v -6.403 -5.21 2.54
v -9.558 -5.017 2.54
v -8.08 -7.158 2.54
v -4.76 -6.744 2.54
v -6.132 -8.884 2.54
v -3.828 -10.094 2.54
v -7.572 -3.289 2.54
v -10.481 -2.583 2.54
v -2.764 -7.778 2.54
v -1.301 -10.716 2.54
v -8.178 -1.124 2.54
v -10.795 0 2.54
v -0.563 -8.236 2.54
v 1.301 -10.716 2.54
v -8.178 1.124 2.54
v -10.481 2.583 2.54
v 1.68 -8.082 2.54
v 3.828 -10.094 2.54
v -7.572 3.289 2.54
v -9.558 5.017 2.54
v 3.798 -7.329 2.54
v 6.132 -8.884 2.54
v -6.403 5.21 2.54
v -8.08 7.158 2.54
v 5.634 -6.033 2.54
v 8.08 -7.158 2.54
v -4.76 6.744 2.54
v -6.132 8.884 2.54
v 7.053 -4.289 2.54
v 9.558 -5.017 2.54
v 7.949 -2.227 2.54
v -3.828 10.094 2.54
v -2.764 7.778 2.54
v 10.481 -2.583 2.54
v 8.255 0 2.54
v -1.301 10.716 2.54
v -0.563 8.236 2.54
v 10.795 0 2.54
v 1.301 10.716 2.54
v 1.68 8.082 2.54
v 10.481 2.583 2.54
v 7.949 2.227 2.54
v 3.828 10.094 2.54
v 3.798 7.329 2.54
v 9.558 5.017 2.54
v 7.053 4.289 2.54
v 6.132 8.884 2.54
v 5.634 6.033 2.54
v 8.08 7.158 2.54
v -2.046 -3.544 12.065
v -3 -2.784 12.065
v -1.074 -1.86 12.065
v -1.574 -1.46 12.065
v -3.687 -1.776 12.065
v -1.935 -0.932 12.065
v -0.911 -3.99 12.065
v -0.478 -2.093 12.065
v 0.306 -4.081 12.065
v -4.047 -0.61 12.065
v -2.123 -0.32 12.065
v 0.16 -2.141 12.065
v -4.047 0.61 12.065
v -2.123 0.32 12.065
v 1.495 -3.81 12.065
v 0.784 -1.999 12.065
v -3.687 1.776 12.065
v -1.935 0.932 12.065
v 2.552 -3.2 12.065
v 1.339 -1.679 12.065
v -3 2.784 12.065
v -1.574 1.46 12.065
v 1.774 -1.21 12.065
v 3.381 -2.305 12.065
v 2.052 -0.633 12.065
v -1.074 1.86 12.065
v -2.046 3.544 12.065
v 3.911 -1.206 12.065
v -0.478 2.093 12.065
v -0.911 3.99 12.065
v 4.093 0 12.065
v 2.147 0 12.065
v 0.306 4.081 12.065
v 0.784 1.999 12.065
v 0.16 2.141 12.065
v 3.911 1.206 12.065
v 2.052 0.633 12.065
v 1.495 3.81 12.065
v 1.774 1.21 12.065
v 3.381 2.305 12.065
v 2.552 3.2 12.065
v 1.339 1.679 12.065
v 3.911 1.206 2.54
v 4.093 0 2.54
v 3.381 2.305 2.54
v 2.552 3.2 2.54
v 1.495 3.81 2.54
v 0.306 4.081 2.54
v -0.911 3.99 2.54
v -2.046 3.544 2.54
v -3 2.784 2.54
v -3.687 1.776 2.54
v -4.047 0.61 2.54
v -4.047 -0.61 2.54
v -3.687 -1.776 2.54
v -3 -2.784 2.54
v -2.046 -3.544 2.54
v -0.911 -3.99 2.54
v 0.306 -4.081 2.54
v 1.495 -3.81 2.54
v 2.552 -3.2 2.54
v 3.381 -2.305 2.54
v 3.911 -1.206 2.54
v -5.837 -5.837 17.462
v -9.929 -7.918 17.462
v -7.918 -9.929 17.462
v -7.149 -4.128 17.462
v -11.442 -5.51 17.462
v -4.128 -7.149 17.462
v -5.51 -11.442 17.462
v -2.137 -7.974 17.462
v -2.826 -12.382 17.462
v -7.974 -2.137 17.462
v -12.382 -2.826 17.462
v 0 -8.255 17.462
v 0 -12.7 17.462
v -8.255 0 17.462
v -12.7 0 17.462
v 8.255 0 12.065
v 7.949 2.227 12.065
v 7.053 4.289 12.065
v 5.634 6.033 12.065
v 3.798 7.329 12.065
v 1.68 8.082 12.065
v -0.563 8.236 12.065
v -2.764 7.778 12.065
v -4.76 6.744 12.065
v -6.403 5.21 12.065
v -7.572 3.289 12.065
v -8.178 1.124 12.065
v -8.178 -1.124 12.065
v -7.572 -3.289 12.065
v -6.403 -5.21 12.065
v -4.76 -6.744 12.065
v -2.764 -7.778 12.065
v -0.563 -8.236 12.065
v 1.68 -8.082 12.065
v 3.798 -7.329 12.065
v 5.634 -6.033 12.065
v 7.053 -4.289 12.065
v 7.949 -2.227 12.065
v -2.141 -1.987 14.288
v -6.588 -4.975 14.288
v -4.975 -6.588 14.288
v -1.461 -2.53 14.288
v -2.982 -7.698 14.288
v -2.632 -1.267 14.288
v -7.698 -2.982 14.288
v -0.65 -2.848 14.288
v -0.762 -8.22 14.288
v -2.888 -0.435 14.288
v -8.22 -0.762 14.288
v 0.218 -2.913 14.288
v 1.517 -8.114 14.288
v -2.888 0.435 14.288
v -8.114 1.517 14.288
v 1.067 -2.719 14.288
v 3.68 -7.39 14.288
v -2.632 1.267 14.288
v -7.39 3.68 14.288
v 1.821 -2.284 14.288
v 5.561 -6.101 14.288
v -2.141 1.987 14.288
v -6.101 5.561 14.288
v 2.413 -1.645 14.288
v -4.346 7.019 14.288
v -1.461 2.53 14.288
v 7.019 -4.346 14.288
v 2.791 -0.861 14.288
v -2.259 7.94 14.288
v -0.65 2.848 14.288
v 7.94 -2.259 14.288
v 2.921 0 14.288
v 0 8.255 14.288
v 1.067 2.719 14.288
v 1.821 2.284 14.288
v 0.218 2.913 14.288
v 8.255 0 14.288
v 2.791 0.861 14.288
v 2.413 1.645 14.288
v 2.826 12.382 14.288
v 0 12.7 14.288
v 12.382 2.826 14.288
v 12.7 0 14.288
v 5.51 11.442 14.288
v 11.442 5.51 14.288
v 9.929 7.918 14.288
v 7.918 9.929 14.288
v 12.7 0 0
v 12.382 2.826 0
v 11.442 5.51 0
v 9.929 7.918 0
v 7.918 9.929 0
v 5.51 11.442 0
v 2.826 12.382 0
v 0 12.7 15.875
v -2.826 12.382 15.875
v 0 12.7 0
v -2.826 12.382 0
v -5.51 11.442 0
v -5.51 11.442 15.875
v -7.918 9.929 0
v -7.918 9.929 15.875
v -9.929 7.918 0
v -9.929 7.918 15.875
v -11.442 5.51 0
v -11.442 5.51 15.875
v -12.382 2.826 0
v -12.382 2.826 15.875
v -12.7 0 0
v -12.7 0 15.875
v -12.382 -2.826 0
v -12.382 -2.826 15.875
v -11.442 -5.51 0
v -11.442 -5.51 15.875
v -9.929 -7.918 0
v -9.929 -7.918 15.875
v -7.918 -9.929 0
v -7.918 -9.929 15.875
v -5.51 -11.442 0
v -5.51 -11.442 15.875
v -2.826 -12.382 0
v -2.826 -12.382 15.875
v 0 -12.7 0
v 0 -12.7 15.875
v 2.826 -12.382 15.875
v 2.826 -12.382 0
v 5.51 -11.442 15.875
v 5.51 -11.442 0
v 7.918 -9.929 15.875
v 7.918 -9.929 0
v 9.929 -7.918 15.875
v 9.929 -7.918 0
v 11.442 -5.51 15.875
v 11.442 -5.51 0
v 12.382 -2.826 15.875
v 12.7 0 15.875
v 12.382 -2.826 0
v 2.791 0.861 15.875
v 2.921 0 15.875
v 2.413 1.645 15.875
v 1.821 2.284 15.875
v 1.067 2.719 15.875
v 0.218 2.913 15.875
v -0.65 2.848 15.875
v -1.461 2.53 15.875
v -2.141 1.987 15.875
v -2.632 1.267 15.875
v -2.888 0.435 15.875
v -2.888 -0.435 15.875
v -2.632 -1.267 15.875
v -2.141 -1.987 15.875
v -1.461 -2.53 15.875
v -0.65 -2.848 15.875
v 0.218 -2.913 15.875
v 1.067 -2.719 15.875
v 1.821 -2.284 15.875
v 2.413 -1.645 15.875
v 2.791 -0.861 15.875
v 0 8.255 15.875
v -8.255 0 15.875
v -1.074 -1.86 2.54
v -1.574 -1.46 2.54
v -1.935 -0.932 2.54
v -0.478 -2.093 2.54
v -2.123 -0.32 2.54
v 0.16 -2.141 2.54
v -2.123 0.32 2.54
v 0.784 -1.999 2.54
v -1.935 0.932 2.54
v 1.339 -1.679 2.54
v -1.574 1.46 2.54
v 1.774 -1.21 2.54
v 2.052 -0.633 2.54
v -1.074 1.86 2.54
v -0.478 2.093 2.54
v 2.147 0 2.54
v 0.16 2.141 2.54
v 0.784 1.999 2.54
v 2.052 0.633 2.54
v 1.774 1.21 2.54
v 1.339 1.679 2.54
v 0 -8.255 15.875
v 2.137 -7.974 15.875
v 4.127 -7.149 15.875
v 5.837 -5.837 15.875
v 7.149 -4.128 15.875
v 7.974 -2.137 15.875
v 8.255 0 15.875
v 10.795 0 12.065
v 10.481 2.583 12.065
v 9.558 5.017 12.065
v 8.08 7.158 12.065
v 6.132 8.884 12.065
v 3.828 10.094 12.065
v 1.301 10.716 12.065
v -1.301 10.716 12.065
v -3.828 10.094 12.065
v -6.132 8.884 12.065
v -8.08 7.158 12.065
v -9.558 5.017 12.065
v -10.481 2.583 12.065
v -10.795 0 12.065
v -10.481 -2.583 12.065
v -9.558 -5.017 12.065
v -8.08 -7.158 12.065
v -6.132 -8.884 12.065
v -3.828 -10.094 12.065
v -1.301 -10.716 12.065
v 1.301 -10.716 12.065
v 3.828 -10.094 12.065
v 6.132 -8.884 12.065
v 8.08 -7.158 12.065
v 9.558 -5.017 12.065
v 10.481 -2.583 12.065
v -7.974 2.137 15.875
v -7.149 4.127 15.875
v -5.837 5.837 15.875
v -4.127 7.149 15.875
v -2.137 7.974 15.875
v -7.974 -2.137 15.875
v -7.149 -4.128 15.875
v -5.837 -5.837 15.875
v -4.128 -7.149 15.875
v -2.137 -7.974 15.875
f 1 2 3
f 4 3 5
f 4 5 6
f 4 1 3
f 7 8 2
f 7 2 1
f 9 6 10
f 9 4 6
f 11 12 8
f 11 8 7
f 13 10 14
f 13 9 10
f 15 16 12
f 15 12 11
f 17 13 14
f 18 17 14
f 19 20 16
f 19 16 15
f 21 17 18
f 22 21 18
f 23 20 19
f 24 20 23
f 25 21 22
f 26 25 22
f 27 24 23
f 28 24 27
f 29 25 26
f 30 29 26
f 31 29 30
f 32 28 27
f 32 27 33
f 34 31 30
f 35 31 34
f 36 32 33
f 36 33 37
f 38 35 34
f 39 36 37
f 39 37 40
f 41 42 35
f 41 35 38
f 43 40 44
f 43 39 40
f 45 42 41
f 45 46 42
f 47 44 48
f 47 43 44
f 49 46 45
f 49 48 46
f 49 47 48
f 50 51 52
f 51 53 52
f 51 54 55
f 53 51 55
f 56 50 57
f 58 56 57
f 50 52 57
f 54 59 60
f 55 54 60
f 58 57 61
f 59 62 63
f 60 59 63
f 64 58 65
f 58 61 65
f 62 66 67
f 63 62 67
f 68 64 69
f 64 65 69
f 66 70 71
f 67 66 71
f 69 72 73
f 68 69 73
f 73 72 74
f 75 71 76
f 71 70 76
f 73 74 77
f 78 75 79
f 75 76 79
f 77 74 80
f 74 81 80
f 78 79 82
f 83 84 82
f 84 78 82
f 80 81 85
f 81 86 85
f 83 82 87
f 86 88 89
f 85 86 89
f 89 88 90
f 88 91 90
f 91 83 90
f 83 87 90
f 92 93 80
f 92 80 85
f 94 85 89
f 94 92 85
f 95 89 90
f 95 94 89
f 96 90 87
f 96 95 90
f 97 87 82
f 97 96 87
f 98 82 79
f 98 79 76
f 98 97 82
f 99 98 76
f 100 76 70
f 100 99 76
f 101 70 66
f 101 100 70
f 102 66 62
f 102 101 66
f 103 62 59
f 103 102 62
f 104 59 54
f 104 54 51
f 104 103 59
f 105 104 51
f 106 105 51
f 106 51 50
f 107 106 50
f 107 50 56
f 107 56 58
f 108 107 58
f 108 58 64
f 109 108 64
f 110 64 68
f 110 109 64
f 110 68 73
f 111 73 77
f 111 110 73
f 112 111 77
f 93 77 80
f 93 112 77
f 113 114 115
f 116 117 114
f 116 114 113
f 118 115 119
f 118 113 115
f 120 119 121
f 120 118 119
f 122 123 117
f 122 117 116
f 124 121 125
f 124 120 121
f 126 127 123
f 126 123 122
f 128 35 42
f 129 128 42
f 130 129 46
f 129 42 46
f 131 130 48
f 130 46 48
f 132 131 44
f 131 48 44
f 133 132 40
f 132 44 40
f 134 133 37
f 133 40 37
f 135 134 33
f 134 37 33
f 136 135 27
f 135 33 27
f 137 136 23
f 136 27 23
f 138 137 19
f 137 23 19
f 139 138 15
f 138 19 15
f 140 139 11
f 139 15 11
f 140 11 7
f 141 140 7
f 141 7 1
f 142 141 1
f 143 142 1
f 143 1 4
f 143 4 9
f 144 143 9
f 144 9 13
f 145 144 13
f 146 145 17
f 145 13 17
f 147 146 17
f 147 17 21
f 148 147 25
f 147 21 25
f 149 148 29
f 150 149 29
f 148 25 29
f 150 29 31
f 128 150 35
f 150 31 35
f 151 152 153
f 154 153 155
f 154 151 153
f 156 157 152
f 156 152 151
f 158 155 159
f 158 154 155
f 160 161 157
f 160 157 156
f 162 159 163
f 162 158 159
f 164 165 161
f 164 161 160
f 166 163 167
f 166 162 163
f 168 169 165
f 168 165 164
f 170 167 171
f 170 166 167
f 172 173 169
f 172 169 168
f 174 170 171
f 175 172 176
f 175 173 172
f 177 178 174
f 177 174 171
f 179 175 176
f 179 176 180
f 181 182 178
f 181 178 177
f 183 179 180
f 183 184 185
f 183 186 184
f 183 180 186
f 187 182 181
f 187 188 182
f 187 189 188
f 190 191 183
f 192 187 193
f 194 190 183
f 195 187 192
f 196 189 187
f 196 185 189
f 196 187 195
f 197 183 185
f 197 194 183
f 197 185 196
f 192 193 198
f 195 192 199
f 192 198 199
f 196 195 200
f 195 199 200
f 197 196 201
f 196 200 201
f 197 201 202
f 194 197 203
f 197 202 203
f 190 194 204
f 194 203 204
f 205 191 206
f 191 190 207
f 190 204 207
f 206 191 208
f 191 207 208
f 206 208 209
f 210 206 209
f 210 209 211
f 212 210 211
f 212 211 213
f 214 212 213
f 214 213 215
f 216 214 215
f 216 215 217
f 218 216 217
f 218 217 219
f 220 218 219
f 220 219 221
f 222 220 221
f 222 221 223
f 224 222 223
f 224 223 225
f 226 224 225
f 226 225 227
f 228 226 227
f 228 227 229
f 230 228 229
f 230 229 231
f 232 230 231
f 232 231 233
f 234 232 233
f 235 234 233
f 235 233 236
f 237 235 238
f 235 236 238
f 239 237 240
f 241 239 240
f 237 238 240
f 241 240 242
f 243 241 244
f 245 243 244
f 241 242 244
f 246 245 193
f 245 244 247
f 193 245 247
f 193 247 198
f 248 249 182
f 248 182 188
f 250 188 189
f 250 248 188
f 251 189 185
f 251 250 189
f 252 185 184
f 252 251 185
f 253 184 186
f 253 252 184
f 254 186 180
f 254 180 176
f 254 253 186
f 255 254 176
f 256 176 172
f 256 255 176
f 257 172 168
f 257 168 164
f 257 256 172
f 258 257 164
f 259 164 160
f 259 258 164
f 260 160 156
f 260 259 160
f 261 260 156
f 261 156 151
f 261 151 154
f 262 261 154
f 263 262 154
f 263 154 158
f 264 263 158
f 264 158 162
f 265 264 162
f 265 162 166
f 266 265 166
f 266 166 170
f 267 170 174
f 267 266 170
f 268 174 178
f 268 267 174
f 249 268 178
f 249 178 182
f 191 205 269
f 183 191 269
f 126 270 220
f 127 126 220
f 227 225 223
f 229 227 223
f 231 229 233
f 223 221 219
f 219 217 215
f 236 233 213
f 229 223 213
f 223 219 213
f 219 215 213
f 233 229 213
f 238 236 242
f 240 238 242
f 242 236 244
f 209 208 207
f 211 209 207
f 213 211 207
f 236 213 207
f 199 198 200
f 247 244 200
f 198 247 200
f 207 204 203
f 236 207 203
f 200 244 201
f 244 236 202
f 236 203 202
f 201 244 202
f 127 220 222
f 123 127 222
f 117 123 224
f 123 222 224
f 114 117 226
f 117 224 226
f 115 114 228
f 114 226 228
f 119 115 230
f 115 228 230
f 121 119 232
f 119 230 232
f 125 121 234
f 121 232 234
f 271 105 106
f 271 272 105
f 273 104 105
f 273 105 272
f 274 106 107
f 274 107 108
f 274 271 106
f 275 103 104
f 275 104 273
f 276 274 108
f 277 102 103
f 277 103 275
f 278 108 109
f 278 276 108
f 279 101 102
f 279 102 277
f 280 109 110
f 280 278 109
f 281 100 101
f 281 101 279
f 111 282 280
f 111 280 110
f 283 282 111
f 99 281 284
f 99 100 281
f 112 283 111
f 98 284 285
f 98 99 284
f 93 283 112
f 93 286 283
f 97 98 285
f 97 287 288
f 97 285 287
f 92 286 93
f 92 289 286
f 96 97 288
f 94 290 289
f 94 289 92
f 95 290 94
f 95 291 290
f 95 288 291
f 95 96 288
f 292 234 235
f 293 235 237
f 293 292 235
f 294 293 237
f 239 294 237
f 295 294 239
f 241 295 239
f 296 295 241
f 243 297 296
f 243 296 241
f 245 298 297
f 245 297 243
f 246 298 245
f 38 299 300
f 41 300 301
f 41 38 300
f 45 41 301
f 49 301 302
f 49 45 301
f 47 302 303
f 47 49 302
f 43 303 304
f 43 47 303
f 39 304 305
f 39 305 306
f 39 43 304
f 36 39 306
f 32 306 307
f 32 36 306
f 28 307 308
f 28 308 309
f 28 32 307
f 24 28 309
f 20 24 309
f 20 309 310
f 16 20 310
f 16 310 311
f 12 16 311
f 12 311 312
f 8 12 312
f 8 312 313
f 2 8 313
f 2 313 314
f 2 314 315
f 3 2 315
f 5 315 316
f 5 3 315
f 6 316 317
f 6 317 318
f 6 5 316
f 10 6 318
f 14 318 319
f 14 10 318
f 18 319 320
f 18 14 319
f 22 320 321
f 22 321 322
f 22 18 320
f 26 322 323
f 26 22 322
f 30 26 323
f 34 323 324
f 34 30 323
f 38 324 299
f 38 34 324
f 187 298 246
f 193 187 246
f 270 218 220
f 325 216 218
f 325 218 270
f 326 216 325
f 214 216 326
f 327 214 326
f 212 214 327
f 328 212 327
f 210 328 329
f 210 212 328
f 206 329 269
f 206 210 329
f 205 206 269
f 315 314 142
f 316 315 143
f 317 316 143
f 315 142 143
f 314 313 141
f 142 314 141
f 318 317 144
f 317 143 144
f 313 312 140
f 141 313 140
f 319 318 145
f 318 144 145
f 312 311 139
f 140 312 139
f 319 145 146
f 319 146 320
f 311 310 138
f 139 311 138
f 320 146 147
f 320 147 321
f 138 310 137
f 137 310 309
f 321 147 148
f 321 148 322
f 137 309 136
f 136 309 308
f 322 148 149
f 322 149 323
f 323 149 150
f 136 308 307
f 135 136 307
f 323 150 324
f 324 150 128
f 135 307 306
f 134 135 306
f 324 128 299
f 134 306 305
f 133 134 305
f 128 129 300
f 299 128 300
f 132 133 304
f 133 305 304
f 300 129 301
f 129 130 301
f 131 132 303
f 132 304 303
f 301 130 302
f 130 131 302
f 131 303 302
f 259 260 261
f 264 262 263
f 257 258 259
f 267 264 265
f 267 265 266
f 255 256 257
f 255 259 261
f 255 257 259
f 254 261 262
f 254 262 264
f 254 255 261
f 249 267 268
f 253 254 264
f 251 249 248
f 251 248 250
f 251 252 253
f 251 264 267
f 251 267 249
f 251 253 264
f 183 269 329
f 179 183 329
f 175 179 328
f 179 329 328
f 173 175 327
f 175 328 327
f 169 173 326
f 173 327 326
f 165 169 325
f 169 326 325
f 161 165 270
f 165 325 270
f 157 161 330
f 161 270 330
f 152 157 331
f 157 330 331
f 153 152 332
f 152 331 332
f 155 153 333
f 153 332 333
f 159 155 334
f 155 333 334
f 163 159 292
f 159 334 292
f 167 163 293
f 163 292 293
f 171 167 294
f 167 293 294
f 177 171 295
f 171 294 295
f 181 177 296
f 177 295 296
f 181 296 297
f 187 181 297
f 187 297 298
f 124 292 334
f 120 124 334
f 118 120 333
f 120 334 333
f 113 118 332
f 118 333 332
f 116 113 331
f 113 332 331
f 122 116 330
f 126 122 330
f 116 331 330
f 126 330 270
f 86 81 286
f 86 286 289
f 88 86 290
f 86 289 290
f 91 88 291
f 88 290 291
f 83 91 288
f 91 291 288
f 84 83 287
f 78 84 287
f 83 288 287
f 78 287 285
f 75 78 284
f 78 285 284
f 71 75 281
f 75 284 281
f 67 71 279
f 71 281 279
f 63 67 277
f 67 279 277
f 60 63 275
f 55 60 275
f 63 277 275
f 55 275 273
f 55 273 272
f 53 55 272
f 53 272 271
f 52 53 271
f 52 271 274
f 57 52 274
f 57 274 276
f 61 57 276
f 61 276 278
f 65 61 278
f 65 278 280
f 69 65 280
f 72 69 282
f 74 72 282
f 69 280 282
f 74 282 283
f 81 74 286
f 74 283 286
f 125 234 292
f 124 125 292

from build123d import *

# Parameters (mm, degrees)
F0_R      = 12.7
F0_R_2    = 8.255
F0_R_3    = 2.921
F1_DEPTH  = 15.875
F2_R      = 8.255
F2_R_2    = 2.921
F3_DEPTH  = 1.5875
F5_DEPTH  = 1.5875
F7_DEPTH  = 1.5875
F9_R      = 10.795
F9_R_2    = 8.255
F10_DEPTH = 9.525
F11_R     = 4.0925147824
F11_R_2   = 2.147201803
F12_DEPTH = 9.525


with BuildPart() as f1:
    # F0 (on Top) → F1 (new body)
    with BuildSketch(Plane.XY):
        Circle(F0_R)
        Circle(F0_R_2, mode=Mode.SUBTRACT)
        Circle(F0_R_2)
        Circle(F0_R_3, mode=Mode.SUBTRACT)
        Circle(F0_R_3)
    extrude(amount=F1_DEPTH)

    # F2 (on face) → F3 (cut)
    with BuildSketch(Plane.XY.offset(15.875)):
        Circle(F2_R)
        Circle(F2_R_2, mode=Mode.SUBTRACT)
    extrude(amount=-F3_DEPTH, mode=Mode.SUBTRACT)

    # F4 (on face) → F5 (cut, through all)
    with BuildSketch(Plane.XY.offset(15.875)):
        with BuildLine():
            ThreePointArc((0, 8.255), (5.8371664787, 5.8371664787), (8.255, 0))
            Line((8.255, 0), (12.7, 0))
            ThreePointArc((12.7, 0), (8.9802561211, 8.9802561211), (0, 12.7))
            Line((0, 12.7), (0, 8.255))
        make_face()
    extrude(amount=-F5_DEPTH, mode=Mode.SUBTRACT)

    # F6 (on face) → F7 (join)
    with BuildSketch(Plane.XY.offset(15.875)):
        with BuildLine():
            Line((0, -12.7), (0, -8.255))
            ThreePointArc((0, -8.255), (-5.8371664787, -5.8371664787), (-8.255, 0))
            Line((-8.255, 0), (-12.7, 0))
            ThreePointArc((-12.7, 0), (-8.9802561211, -8.9802561211), (0, -12.7))
        make_face()
    extrude(amount=F7_DEPTH)

    # F9 (on offset) → F10 (cut)
    with BuildSketch(Plane.XY.offset(2.54)):
        Circle(F9_R)
        Circle(F9_R_2, mode=Mode.SUBTRACT)
    extrude(amount=F10_DEPTH, mode=Mode.SUBTRACT)

    # F11 (on offset) → F12 (cut)
    with BuildSketch(Plane.XY.offset(2.54)):
        Circle(F11_R)
        Circle(F11_R_2, mode=Mode.SUBTRACT)
    extrude(amount=F12_DEPTH, mode=Mode.SUBTRACT)


solid = f1.part
